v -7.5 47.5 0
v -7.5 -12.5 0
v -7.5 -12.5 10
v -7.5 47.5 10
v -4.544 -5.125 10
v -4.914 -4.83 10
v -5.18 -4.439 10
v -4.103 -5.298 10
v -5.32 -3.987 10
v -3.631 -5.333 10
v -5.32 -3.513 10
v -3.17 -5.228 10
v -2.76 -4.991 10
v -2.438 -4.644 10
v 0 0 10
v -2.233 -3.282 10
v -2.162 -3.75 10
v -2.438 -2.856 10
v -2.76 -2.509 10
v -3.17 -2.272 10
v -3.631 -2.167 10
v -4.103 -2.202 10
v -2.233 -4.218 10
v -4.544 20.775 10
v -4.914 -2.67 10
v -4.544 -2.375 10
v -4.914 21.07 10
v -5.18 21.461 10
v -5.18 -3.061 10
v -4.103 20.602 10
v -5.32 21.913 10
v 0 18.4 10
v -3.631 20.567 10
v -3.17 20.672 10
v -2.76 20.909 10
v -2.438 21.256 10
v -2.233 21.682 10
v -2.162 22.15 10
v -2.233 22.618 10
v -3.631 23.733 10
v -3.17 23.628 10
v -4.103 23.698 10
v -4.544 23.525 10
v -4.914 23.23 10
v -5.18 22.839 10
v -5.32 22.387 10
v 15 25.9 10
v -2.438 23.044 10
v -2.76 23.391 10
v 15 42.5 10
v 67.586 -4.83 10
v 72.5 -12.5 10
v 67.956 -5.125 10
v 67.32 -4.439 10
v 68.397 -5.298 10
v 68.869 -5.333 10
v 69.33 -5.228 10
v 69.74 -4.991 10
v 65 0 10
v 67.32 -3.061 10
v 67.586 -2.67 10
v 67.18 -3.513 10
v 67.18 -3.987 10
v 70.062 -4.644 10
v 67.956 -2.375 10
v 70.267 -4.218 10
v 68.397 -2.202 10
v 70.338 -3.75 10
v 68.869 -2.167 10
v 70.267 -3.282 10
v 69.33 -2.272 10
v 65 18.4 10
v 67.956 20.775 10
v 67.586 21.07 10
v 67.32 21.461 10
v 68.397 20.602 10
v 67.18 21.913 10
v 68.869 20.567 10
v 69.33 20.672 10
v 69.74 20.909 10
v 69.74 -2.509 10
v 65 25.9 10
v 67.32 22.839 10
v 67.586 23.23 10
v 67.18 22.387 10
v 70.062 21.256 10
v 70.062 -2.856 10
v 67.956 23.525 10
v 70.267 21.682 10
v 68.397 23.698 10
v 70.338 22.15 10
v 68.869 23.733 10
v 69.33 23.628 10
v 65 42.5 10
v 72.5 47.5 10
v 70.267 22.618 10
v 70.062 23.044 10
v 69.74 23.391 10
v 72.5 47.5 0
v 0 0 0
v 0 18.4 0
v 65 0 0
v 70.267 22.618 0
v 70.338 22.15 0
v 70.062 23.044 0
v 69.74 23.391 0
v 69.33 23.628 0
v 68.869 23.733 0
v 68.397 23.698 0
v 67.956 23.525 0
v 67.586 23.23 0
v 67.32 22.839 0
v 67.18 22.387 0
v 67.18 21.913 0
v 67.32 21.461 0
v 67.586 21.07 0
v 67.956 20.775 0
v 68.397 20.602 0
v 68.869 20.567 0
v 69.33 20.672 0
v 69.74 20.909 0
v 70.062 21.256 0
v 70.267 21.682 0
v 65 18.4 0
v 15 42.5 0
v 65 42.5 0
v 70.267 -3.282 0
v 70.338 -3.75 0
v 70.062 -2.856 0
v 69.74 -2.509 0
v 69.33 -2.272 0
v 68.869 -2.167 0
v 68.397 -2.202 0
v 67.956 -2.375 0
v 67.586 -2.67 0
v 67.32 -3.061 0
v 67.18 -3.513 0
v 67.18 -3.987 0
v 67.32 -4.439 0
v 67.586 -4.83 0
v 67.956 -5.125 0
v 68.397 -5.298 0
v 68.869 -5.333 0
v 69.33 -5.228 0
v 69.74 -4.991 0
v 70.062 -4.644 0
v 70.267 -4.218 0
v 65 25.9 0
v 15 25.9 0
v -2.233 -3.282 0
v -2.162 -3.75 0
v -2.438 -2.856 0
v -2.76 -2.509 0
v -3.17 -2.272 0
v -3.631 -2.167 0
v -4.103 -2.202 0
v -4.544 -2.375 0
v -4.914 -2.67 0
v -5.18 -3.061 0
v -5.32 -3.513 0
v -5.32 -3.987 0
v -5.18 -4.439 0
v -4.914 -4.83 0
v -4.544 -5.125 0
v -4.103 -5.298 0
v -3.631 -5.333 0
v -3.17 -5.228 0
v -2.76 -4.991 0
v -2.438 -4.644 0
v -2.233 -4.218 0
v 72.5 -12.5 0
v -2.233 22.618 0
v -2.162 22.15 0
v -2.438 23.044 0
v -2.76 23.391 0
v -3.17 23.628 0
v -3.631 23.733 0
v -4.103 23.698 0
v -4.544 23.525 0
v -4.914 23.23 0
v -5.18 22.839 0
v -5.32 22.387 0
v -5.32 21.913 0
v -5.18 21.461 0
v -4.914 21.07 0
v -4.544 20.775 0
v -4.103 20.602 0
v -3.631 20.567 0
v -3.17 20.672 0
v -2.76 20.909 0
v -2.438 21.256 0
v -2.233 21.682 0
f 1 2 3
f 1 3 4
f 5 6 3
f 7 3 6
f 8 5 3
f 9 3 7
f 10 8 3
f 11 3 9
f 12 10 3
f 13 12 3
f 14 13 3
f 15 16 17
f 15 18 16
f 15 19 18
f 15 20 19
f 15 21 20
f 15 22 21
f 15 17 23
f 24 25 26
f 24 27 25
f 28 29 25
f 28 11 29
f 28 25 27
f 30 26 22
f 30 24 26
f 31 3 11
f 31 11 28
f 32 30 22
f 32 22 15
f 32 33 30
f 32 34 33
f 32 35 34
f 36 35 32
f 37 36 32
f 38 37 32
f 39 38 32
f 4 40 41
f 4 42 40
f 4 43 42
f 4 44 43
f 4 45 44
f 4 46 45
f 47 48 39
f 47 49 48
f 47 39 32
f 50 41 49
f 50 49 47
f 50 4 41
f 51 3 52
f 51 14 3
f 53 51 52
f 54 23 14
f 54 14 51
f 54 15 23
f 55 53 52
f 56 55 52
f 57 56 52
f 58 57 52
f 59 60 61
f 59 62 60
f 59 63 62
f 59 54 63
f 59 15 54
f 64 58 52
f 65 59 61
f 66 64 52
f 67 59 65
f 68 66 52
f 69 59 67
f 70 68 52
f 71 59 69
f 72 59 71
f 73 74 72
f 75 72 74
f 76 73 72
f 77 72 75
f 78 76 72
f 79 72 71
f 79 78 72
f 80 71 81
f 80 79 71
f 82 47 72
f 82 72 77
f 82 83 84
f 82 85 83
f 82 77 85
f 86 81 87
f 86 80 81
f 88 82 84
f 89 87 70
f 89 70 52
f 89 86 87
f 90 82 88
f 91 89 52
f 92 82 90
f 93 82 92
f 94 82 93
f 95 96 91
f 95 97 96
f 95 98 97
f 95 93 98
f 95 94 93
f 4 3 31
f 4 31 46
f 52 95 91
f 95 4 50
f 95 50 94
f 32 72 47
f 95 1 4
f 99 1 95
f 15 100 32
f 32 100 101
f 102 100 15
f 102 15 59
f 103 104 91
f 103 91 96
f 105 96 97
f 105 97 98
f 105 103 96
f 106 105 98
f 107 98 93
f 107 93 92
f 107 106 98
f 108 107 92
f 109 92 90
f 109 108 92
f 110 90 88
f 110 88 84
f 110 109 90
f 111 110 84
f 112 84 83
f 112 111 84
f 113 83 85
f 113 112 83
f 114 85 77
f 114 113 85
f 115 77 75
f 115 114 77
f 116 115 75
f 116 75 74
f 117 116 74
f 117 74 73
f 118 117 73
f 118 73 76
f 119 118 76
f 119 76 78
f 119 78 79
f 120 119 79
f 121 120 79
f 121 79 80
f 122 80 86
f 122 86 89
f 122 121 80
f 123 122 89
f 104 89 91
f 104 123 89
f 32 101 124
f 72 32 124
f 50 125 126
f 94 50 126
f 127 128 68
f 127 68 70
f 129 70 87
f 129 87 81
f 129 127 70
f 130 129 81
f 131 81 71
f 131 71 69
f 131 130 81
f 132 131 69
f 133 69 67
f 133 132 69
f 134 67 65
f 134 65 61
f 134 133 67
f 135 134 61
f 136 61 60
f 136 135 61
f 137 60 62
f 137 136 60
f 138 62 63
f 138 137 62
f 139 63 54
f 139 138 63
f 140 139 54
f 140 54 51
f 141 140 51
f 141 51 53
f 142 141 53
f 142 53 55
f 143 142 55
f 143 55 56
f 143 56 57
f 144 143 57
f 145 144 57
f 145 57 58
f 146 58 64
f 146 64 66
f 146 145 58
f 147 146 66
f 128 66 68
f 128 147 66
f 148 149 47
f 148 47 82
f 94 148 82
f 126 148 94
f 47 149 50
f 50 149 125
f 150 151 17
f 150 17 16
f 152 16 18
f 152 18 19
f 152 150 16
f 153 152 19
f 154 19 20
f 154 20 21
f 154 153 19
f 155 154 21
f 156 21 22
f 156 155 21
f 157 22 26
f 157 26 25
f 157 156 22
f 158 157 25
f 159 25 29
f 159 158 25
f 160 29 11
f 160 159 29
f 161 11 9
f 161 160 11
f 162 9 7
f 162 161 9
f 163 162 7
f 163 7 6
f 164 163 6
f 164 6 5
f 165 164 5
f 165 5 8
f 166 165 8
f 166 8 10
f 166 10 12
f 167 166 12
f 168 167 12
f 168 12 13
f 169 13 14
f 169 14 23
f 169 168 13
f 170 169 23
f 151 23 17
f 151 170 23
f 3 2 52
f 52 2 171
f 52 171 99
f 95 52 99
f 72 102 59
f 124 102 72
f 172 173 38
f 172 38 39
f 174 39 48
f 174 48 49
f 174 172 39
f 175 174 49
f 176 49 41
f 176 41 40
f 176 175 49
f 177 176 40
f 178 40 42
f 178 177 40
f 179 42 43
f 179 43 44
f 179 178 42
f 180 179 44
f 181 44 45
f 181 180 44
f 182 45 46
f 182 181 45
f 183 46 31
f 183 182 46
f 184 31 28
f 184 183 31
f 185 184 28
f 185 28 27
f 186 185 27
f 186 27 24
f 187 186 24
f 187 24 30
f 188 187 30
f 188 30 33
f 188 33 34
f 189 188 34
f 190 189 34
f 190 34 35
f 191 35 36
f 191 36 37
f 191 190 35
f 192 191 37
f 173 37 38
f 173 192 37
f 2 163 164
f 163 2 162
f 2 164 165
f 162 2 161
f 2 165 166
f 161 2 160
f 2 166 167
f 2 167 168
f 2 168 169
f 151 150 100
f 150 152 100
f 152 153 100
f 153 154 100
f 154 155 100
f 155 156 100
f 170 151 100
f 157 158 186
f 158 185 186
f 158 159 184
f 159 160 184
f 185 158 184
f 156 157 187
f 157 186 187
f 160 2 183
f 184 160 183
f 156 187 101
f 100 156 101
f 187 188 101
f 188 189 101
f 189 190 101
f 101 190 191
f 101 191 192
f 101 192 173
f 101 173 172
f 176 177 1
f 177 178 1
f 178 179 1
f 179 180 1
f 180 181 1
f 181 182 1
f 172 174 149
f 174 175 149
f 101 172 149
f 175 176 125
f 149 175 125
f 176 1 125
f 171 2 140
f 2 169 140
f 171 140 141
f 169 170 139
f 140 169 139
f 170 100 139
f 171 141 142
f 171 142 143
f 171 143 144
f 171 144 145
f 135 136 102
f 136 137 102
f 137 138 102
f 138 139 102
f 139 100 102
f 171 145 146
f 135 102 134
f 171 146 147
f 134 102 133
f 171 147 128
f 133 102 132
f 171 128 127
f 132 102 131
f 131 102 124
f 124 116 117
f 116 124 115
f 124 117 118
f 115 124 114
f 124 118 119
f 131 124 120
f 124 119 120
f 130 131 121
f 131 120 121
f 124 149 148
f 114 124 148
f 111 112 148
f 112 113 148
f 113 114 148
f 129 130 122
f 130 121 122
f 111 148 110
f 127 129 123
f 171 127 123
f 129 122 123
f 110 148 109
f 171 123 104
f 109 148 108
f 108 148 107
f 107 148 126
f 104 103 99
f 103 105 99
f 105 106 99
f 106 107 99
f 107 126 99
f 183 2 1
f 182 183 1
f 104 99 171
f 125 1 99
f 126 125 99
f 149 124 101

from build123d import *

# Parameters (mm, degrees)
SKETCH1_W           = 80
SKETCH1_H           = 60
SKETCH1_W_2         = 50
SKETCH1_H_2         = 16.6
SKETCH1_R           = 1.5875
SKETCH1_W_3         = 65
SKETCH1_H_3         = 18.4
BOSS_EXTRUDE1_DEPTH = 10


with BuildPart() as part:
    # Sketch1 → Boss-Extrude1 (new body)
    with BuildSketch(Plane.XY):
        with Locations((32.5, 17.5)):
            Rectangle(SKETCH1_W, SKETCH1_H)
        with Locations((40, 34.2)):
            Rectangle(SKETCH1_W_2, SKETCH1_H_2, mode=Mode.SUBTRACT)
        with Locations((-3.75, -3.75)):
            Circle(SKETCH1_R, mode=Mode.SUBTRACT)
        with Locations((68.75, -3.75)):
            Circle(SKETCH1_R, mode=Mode.SUBTRACT)
        with Locations((-3.75, 22.15)):
            Circle(SKETCH1_R, mode=Mode.SUBTRACT)
        with Locations((32.5, 9.2)):
            Rectangle(SKETCH1_W_3, SKETCH1_H_3, mode=Mode.SUBTRACT)
        with Locations((68.75, 22.15)):
            Circle(SKETCH1_R, mode=Mode.SUBTRACT)
    extrude(amount=BOSS_EXTRUDE1_DEPTH)


solid = part.part
